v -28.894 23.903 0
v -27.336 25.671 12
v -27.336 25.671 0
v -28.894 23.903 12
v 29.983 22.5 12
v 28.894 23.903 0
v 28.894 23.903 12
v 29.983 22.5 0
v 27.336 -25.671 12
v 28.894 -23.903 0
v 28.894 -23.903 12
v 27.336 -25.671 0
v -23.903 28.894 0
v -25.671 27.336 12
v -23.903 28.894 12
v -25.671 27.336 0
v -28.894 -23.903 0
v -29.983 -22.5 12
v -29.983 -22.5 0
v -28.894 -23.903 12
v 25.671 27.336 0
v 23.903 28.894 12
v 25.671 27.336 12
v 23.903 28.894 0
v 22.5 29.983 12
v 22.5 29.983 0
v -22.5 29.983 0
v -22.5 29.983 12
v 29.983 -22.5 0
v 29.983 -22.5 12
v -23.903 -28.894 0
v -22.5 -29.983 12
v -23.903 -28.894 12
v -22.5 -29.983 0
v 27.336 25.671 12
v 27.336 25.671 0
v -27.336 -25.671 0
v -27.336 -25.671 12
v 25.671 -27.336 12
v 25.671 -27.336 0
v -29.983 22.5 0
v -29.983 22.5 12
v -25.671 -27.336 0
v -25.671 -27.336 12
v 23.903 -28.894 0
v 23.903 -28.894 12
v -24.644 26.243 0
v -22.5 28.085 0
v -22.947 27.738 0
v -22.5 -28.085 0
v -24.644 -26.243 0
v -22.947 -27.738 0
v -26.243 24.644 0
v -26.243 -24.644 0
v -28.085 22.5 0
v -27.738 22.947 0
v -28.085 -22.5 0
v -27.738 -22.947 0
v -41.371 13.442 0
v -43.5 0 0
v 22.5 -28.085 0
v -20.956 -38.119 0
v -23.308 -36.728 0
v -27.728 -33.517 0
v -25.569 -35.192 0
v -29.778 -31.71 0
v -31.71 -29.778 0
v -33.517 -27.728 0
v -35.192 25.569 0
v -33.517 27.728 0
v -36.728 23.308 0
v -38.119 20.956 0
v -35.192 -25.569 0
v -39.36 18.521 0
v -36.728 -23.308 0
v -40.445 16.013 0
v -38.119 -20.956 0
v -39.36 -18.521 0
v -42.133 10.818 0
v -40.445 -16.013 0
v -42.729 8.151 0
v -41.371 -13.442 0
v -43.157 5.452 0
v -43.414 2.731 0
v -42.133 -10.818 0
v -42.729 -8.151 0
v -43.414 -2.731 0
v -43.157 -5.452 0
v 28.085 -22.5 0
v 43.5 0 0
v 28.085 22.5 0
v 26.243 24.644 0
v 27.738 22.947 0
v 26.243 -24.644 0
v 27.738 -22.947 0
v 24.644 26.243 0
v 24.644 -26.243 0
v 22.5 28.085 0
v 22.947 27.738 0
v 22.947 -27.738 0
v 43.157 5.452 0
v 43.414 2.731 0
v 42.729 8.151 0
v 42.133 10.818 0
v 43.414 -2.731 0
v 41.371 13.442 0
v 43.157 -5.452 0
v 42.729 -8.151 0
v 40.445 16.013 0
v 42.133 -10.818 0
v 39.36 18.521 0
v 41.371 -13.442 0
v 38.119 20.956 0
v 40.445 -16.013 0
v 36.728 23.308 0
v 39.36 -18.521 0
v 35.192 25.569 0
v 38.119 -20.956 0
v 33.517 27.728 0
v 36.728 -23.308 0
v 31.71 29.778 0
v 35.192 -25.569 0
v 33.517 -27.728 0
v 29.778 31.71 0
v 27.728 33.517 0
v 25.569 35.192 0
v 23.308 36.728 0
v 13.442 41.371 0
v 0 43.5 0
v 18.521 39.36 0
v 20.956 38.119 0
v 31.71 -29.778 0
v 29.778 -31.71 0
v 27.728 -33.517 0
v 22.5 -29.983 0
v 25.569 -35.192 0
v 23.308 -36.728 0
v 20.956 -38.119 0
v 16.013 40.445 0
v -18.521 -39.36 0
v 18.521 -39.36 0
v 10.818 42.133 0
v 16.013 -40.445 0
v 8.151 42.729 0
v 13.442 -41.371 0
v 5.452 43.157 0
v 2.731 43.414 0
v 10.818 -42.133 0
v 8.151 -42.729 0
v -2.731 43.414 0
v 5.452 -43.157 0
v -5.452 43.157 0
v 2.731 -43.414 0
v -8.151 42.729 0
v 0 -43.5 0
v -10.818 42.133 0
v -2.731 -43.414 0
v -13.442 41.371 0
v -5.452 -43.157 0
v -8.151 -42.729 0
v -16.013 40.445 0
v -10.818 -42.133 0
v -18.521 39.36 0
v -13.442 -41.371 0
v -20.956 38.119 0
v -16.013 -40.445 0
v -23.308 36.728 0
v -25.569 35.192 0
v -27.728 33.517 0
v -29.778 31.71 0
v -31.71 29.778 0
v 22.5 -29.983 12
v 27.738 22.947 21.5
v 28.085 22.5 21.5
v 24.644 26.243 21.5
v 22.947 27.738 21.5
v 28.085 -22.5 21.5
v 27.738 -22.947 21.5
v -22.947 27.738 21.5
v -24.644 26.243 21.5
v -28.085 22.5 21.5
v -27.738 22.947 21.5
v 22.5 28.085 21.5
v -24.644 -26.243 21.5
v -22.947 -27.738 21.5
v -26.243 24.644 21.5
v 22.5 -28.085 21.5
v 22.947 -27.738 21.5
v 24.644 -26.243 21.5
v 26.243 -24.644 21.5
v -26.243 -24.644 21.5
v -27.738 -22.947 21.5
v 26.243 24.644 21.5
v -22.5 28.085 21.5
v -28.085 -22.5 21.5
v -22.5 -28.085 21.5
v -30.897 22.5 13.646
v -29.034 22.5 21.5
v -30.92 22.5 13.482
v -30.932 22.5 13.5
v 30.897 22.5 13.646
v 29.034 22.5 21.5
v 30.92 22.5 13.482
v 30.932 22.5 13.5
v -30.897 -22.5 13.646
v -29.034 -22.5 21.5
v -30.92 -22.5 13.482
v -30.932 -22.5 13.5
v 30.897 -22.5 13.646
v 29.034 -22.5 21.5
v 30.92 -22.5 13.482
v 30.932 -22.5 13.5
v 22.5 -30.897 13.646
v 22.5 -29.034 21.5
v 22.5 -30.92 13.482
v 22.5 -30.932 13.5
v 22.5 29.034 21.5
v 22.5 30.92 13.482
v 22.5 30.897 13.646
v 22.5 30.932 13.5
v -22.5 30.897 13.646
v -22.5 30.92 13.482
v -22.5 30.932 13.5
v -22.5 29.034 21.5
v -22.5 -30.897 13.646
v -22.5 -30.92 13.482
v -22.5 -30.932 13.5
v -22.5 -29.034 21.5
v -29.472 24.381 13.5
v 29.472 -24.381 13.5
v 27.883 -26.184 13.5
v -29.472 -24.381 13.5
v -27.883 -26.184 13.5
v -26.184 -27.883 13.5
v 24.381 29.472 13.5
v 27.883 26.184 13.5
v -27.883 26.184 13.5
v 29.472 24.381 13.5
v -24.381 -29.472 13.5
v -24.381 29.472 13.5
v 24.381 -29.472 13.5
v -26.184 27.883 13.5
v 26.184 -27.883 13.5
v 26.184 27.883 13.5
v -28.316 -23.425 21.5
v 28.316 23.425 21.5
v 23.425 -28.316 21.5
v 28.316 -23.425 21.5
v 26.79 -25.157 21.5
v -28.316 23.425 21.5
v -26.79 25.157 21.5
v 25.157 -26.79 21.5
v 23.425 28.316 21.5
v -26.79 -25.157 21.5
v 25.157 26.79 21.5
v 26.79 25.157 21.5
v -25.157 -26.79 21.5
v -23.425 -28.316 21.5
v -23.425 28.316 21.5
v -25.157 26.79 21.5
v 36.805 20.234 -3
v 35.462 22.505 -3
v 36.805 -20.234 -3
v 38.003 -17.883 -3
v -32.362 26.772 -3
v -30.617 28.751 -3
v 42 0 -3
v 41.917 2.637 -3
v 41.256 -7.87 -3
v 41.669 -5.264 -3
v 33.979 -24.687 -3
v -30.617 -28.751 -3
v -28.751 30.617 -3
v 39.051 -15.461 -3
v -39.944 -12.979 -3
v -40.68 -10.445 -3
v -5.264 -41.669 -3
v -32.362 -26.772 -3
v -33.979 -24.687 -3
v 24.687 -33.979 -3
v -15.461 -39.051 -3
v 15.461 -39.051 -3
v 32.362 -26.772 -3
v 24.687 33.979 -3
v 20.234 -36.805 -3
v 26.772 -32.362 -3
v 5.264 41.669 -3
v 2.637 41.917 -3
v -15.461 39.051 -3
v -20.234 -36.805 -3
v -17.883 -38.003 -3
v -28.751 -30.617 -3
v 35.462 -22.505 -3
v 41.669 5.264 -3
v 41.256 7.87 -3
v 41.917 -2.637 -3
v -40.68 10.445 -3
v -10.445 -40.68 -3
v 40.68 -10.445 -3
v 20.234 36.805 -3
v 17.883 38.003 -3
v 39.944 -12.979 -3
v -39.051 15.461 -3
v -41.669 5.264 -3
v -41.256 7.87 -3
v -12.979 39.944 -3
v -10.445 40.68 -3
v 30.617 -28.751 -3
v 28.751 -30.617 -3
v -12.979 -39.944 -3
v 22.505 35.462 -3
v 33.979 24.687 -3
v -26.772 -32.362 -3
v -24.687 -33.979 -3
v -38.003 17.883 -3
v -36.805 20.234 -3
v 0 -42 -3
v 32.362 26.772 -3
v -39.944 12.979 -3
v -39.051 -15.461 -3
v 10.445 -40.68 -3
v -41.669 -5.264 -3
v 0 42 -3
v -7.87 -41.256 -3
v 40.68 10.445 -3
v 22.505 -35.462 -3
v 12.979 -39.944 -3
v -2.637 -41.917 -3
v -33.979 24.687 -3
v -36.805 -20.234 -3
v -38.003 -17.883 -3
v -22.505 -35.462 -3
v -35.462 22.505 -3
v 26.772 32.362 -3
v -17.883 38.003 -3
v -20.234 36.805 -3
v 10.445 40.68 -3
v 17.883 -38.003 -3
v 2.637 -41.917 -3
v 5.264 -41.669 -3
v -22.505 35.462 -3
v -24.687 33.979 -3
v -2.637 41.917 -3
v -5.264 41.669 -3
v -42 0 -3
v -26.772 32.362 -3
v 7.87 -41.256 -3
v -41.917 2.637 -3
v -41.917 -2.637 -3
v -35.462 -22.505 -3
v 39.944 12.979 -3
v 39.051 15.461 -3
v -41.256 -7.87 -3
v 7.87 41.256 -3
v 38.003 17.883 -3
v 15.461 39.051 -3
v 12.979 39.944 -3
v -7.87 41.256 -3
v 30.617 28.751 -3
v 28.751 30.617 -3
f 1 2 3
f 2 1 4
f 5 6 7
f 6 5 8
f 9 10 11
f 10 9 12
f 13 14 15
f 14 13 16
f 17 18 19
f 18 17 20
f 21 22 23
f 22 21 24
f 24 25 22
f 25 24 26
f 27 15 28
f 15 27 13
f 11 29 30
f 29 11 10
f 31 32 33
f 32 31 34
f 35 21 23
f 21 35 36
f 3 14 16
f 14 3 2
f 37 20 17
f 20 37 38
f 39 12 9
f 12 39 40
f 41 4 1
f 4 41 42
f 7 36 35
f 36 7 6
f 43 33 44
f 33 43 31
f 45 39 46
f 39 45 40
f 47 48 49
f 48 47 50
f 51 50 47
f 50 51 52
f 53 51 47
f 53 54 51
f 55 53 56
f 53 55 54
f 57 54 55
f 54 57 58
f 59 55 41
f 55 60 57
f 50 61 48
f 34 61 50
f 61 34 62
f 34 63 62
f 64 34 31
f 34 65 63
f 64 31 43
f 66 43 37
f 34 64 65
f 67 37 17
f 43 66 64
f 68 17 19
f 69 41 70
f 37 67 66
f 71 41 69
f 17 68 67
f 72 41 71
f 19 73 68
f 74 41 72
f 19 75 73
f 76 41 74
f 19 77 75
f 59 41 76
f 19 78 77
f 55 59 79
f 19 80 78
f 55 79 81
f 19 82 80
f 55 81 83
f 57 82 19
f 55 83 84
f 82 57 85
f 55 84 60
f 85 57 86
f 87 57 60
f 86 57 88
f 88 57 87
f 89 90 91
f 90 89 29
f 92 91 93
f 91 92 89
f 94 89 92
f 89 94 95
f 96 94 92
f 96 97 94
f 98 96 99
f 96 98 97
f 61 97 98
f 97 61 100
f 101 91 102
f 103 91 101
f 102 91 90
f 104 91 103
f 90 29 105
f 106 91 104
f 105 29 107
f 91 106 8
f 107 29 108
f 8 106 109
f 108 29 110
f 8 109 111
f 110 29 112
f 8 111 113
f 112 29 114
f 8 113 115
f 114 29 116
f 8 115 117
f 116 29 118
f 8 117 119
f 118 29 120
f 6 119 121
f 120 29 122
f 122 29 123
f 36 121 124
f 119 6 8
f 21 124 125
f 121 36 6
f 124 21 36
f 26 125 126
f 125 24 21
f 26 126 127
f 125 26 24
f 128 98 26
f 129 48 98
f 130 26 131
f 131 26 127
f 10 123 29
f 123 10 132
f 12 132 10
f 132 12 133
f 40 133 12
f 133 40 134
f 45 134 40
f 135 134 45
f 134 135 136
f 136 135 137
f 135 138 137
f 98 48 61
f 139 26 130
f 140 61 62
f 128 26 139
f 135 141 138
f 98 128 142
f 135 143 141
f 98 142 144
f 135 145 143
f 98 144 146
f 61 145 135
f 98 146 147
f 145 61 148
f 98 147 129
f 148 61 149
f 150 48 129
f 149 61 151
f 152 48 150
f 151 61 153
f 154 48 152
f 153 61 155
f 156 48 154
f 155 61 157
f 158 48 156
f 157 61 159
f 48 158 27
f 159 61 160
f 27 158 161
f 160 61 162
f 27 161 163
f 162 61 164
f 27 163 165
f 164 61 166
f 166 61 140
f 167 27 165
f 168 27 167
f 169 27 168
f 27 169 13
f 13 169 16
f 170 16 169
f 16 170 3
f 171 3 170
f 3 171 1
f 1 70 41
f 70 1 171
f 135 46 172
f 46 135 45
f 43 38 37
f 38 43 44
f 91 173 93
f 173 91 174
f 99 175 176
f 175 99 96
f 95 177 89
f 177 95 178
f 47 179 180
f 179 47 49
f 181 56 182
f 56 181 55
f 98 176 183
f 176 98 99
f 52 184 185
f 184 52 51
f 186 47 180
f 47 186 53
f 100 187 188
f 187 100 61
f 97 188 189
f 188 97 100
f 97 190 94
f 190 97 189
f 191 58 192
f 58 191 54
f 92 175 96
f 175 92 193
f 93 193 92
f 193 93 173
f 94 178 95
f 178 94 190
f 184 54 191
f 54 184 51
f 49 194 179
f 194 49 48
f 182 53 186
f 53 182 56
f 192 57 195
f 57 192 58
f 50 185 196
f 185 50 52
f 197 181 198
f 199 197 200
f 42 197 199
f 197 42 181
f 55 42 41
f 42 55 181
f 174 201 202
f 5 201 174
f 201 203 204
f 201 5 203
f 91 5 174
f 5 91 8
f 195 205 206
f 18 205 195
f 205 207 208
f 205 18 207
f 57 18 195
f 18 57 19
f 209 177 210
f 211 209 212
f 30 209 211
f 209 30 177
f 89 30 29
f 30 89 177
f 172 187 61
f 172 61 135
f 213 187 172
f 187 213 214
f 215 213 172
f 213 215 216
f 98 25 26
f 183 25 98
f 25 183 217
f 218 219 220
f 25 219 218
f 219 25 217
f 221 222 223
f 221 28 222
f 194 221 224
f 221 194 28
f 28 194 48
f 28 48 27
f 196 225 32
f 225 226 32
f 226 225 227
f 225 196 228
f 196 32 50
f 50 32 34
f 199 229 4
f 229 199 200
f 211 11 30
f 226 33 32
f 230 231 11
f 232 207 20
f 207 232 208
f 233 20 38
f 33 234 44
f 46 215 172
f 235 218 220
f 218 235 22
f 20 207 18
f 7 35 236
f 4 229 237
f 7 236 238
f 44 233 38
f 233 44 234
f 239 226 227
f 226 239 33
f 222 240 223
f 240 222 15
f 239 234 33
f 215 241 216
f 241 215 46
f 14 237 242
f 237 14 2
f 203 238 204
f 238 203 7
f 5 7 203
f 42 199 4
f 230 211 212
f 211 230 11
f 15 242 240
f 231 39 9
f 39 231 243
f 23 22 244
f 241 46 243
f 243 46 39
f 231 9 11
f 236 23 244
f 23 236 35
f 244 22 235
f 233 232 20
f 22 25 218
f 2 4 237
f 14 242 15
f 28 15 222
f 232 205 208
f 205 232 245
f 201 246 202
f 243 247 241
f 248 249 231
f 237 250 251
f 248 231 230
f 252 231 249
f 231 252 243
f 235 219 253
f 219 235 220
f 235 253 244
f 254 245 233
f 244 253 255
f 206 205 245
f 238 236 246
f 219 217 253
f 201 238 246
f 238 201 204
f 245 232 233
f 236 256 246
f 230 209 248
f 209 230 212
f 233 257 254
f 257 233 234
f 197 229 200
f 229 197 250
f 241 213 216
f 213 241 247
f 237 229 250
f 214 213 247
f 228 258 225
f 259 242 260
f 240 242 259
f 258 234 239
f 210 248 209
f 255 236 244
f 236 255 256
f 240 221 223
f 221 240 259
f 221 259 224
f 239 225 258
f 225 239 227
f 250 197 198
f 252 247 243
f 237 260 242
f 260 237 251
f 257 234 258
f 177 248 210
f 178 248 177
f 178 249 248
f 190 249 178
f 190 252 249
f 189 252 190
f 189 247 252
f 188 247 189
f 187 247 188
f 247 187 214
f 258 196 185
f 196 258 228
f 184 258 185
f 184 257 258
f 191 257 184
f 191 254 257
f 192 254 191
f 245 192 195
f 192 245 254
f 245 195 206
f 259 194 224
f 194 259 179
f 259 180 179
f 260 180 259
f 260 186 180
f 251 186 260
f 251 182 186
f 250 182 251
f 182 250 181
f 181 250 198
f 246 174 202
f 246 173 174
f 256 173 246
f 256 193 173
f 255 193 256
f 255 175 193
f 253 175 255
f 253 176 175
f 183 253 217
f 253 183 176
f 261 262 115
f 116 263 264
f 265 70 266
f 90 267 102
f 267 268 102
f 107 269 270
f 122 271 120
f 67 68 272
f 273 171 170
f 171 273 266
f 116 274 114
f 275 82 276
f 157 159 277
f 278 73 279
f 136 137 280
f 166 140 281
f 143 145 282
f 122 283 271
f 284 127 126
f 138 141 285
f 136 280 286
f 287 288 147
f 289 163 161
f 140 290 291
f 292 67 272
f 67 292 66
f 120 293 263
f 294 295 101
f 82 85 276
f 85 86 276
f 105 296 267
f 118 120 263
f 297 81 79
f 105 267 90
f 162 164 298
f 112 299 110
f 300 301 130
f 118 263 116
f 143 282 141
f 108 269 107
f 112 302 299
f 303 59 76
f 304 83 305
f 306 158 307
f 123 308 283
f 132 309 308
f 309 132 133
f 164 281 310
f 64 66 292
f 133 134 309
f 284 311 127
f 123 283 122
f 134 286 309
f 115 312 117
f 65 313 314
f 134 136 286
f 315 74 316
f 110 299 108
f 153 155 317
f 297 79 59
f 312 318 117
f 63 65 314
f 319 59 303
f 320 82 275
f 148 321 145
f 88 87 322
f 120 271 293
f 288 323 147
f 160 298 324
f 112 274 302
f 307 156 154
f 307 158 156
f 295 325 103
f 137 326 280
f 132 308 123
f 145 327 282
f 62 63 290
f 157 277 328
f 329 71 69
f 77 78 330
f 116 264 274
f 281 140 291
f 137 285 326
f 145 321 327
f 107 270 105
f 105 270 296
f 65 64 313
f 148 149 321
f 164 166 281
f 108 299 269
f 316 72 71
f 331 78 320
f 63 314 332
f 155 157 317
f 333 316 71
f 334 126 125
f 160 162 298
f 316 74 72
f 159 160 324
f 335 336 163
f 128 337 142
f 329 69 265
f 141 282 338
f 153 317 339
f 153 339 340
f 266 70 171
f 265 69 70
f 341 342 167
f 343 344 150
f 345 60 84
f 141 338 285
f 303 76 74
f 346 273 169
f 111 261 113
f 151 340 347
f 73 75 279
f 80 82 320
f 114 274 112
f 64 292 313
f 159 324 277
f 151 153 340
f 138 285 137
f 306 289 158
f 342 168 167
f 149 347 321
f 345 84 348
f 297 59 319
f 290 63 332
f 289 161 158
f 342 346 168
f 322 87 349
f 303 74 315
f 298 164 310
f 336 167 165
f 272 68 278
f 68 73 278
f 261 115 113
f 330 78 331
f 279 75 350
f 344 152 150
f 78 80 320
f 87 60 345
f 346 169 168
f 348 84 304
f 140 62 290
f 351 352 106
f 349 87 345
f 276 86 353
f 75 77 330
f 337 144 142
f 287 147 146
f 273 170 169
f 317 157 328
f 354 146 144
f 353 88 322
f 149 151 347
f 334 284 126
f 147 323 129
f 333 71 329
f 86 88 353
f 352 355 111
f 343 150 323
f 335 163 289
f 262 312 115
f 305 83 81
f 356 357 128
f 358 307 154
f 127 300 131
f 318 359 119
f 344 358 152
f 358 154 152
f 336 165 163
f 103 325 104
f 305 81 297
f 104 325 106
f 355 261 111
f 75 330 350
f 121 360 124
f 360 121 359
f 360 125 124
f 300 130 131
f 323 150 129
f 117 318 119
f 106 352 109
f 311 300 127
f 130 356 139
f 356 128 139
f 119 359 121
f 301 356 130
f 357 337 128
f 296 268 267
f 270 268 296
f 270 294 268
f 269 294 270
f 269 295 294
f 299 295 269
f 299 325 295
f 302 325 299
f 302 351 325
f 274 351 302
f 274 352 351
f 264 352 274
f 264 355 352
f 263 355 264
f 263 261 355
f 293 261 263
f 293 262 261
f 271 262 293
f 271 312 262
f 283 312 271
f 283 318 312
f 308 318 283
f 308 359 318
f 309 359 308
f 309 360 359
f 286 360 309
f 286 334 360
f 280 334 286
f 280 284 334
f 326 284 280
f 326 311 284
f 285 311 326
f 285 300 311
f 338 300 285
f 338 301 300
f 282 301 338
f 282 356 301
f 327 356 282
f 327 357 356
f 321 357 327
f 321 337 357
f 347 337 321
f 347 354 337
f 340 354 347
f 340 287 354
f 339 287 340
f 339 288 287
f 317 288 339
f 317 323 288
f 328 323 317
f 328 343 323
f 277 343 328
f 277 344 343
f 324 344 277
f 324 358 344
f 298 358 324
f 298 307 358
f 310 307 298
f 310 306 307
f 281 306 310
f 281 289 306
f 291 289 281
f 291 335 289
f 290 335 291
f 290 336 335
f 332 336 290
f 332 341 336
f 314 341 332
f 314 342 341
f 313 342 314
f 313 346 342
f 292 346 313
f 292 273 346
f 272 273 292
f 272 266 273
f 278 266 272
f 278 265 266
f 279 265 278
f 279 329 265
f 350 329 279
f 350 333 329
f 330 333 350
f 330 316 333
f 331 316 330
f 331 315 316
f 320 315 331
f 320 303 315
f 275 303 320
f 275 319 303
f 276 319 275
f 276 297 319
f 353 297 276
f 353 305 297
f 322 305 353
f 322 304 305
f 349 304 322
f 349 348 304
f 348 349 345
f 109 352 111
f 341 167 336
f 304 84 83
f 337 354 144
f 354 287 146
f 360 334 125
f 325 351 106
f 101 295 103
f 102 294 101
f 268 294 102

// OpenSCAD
//Ceiling blind hole cover
//LGI v1.0, Dec 2016

$fn=100;

//Constants:
blindhole=75; //Diameter of the blind hole to cover
holedepth=12; //Depth of the hole, equals the length of the stands without the hook
thwall=1.5; //Wall thickness for the stands
hbottofhook=thwall; //Height of the widening section of the hook
overlap=6; //mm overlap over the hole
coverh=3; //Height (thickness) of the coverplate

//The actual coverplate (the easy part;-):
cover=blindhole+(2*overlap); //defines the diameter of the coverplate
translate(v=[0,0,(coverh/-1)]) {
cylinder (coverh,d1=cover-coverh,d2=cover);
}

//The four stands:
difference() {
cylinder (holedepth,d1=blindhole,d2=blindhole);
    
cylinder (holedepth,d1=blindhole-(2*thwall),d2=blindhole-(2*thwall));

translate (v=[(blindhole/-2),(blindhole*-0.3),0]) {
cube ([blindhole,(blindhole*0.6),holedepth]);
    }
translate (v=[(blindhole*-0.3),(blindhole/-2),0]) {
cube ([(blindhole*0.6),blindhole,holedepth]);
    }
}


//Clamping hooks lower section:
difference () {
translate(v=[0,0,holedepth]) {
cylinder (hbottofhook,d1=blindhole,d2=blindhole+(1*thwall));
    }
translate (v=[cover/-2,(blindhole*-0.3),holedepth]) {
cube ([cover,(blindhole*0.6),holedepth]);
    }
translate (v=[(blindhole*-0.3),cover/-2,holedepth]) {
cube ([(blindhole*0.6),cover,holedepth]);
    }
translate (v=[0,0,holedepth]) {
cylinder (holedepth,d1=blindhole-(2*thwall),d2=blindhole-(2*thwall));
    }
}

//Clamping hooks upper section:
htopofhook=holedepth+hbottofhook; //Do not modify
difference () {
translate(v=[0,0,htopofhook]) {
cylinder (holedepth*2/3,d1=blindhole+(1*thwall),d2=blindhole-thwall);
    }
translate (v=[cover/-2,(blindhole*-0.3),htopofhook]) {
cube ([cover,(blindhole*0.6),holedepth]);
    }
translate (v=[(blindhole*-0.3),cover/-2,htopofhook]) {
cube ([(blindhole*0.6),cover,holedepth]);
    }
translate (v=[0,0,htopofhook]) {
cylinder (holedepth*2/3,d1=blindhole-(2*thwall),d2=blindhole-(2*thwall));
    }
}
